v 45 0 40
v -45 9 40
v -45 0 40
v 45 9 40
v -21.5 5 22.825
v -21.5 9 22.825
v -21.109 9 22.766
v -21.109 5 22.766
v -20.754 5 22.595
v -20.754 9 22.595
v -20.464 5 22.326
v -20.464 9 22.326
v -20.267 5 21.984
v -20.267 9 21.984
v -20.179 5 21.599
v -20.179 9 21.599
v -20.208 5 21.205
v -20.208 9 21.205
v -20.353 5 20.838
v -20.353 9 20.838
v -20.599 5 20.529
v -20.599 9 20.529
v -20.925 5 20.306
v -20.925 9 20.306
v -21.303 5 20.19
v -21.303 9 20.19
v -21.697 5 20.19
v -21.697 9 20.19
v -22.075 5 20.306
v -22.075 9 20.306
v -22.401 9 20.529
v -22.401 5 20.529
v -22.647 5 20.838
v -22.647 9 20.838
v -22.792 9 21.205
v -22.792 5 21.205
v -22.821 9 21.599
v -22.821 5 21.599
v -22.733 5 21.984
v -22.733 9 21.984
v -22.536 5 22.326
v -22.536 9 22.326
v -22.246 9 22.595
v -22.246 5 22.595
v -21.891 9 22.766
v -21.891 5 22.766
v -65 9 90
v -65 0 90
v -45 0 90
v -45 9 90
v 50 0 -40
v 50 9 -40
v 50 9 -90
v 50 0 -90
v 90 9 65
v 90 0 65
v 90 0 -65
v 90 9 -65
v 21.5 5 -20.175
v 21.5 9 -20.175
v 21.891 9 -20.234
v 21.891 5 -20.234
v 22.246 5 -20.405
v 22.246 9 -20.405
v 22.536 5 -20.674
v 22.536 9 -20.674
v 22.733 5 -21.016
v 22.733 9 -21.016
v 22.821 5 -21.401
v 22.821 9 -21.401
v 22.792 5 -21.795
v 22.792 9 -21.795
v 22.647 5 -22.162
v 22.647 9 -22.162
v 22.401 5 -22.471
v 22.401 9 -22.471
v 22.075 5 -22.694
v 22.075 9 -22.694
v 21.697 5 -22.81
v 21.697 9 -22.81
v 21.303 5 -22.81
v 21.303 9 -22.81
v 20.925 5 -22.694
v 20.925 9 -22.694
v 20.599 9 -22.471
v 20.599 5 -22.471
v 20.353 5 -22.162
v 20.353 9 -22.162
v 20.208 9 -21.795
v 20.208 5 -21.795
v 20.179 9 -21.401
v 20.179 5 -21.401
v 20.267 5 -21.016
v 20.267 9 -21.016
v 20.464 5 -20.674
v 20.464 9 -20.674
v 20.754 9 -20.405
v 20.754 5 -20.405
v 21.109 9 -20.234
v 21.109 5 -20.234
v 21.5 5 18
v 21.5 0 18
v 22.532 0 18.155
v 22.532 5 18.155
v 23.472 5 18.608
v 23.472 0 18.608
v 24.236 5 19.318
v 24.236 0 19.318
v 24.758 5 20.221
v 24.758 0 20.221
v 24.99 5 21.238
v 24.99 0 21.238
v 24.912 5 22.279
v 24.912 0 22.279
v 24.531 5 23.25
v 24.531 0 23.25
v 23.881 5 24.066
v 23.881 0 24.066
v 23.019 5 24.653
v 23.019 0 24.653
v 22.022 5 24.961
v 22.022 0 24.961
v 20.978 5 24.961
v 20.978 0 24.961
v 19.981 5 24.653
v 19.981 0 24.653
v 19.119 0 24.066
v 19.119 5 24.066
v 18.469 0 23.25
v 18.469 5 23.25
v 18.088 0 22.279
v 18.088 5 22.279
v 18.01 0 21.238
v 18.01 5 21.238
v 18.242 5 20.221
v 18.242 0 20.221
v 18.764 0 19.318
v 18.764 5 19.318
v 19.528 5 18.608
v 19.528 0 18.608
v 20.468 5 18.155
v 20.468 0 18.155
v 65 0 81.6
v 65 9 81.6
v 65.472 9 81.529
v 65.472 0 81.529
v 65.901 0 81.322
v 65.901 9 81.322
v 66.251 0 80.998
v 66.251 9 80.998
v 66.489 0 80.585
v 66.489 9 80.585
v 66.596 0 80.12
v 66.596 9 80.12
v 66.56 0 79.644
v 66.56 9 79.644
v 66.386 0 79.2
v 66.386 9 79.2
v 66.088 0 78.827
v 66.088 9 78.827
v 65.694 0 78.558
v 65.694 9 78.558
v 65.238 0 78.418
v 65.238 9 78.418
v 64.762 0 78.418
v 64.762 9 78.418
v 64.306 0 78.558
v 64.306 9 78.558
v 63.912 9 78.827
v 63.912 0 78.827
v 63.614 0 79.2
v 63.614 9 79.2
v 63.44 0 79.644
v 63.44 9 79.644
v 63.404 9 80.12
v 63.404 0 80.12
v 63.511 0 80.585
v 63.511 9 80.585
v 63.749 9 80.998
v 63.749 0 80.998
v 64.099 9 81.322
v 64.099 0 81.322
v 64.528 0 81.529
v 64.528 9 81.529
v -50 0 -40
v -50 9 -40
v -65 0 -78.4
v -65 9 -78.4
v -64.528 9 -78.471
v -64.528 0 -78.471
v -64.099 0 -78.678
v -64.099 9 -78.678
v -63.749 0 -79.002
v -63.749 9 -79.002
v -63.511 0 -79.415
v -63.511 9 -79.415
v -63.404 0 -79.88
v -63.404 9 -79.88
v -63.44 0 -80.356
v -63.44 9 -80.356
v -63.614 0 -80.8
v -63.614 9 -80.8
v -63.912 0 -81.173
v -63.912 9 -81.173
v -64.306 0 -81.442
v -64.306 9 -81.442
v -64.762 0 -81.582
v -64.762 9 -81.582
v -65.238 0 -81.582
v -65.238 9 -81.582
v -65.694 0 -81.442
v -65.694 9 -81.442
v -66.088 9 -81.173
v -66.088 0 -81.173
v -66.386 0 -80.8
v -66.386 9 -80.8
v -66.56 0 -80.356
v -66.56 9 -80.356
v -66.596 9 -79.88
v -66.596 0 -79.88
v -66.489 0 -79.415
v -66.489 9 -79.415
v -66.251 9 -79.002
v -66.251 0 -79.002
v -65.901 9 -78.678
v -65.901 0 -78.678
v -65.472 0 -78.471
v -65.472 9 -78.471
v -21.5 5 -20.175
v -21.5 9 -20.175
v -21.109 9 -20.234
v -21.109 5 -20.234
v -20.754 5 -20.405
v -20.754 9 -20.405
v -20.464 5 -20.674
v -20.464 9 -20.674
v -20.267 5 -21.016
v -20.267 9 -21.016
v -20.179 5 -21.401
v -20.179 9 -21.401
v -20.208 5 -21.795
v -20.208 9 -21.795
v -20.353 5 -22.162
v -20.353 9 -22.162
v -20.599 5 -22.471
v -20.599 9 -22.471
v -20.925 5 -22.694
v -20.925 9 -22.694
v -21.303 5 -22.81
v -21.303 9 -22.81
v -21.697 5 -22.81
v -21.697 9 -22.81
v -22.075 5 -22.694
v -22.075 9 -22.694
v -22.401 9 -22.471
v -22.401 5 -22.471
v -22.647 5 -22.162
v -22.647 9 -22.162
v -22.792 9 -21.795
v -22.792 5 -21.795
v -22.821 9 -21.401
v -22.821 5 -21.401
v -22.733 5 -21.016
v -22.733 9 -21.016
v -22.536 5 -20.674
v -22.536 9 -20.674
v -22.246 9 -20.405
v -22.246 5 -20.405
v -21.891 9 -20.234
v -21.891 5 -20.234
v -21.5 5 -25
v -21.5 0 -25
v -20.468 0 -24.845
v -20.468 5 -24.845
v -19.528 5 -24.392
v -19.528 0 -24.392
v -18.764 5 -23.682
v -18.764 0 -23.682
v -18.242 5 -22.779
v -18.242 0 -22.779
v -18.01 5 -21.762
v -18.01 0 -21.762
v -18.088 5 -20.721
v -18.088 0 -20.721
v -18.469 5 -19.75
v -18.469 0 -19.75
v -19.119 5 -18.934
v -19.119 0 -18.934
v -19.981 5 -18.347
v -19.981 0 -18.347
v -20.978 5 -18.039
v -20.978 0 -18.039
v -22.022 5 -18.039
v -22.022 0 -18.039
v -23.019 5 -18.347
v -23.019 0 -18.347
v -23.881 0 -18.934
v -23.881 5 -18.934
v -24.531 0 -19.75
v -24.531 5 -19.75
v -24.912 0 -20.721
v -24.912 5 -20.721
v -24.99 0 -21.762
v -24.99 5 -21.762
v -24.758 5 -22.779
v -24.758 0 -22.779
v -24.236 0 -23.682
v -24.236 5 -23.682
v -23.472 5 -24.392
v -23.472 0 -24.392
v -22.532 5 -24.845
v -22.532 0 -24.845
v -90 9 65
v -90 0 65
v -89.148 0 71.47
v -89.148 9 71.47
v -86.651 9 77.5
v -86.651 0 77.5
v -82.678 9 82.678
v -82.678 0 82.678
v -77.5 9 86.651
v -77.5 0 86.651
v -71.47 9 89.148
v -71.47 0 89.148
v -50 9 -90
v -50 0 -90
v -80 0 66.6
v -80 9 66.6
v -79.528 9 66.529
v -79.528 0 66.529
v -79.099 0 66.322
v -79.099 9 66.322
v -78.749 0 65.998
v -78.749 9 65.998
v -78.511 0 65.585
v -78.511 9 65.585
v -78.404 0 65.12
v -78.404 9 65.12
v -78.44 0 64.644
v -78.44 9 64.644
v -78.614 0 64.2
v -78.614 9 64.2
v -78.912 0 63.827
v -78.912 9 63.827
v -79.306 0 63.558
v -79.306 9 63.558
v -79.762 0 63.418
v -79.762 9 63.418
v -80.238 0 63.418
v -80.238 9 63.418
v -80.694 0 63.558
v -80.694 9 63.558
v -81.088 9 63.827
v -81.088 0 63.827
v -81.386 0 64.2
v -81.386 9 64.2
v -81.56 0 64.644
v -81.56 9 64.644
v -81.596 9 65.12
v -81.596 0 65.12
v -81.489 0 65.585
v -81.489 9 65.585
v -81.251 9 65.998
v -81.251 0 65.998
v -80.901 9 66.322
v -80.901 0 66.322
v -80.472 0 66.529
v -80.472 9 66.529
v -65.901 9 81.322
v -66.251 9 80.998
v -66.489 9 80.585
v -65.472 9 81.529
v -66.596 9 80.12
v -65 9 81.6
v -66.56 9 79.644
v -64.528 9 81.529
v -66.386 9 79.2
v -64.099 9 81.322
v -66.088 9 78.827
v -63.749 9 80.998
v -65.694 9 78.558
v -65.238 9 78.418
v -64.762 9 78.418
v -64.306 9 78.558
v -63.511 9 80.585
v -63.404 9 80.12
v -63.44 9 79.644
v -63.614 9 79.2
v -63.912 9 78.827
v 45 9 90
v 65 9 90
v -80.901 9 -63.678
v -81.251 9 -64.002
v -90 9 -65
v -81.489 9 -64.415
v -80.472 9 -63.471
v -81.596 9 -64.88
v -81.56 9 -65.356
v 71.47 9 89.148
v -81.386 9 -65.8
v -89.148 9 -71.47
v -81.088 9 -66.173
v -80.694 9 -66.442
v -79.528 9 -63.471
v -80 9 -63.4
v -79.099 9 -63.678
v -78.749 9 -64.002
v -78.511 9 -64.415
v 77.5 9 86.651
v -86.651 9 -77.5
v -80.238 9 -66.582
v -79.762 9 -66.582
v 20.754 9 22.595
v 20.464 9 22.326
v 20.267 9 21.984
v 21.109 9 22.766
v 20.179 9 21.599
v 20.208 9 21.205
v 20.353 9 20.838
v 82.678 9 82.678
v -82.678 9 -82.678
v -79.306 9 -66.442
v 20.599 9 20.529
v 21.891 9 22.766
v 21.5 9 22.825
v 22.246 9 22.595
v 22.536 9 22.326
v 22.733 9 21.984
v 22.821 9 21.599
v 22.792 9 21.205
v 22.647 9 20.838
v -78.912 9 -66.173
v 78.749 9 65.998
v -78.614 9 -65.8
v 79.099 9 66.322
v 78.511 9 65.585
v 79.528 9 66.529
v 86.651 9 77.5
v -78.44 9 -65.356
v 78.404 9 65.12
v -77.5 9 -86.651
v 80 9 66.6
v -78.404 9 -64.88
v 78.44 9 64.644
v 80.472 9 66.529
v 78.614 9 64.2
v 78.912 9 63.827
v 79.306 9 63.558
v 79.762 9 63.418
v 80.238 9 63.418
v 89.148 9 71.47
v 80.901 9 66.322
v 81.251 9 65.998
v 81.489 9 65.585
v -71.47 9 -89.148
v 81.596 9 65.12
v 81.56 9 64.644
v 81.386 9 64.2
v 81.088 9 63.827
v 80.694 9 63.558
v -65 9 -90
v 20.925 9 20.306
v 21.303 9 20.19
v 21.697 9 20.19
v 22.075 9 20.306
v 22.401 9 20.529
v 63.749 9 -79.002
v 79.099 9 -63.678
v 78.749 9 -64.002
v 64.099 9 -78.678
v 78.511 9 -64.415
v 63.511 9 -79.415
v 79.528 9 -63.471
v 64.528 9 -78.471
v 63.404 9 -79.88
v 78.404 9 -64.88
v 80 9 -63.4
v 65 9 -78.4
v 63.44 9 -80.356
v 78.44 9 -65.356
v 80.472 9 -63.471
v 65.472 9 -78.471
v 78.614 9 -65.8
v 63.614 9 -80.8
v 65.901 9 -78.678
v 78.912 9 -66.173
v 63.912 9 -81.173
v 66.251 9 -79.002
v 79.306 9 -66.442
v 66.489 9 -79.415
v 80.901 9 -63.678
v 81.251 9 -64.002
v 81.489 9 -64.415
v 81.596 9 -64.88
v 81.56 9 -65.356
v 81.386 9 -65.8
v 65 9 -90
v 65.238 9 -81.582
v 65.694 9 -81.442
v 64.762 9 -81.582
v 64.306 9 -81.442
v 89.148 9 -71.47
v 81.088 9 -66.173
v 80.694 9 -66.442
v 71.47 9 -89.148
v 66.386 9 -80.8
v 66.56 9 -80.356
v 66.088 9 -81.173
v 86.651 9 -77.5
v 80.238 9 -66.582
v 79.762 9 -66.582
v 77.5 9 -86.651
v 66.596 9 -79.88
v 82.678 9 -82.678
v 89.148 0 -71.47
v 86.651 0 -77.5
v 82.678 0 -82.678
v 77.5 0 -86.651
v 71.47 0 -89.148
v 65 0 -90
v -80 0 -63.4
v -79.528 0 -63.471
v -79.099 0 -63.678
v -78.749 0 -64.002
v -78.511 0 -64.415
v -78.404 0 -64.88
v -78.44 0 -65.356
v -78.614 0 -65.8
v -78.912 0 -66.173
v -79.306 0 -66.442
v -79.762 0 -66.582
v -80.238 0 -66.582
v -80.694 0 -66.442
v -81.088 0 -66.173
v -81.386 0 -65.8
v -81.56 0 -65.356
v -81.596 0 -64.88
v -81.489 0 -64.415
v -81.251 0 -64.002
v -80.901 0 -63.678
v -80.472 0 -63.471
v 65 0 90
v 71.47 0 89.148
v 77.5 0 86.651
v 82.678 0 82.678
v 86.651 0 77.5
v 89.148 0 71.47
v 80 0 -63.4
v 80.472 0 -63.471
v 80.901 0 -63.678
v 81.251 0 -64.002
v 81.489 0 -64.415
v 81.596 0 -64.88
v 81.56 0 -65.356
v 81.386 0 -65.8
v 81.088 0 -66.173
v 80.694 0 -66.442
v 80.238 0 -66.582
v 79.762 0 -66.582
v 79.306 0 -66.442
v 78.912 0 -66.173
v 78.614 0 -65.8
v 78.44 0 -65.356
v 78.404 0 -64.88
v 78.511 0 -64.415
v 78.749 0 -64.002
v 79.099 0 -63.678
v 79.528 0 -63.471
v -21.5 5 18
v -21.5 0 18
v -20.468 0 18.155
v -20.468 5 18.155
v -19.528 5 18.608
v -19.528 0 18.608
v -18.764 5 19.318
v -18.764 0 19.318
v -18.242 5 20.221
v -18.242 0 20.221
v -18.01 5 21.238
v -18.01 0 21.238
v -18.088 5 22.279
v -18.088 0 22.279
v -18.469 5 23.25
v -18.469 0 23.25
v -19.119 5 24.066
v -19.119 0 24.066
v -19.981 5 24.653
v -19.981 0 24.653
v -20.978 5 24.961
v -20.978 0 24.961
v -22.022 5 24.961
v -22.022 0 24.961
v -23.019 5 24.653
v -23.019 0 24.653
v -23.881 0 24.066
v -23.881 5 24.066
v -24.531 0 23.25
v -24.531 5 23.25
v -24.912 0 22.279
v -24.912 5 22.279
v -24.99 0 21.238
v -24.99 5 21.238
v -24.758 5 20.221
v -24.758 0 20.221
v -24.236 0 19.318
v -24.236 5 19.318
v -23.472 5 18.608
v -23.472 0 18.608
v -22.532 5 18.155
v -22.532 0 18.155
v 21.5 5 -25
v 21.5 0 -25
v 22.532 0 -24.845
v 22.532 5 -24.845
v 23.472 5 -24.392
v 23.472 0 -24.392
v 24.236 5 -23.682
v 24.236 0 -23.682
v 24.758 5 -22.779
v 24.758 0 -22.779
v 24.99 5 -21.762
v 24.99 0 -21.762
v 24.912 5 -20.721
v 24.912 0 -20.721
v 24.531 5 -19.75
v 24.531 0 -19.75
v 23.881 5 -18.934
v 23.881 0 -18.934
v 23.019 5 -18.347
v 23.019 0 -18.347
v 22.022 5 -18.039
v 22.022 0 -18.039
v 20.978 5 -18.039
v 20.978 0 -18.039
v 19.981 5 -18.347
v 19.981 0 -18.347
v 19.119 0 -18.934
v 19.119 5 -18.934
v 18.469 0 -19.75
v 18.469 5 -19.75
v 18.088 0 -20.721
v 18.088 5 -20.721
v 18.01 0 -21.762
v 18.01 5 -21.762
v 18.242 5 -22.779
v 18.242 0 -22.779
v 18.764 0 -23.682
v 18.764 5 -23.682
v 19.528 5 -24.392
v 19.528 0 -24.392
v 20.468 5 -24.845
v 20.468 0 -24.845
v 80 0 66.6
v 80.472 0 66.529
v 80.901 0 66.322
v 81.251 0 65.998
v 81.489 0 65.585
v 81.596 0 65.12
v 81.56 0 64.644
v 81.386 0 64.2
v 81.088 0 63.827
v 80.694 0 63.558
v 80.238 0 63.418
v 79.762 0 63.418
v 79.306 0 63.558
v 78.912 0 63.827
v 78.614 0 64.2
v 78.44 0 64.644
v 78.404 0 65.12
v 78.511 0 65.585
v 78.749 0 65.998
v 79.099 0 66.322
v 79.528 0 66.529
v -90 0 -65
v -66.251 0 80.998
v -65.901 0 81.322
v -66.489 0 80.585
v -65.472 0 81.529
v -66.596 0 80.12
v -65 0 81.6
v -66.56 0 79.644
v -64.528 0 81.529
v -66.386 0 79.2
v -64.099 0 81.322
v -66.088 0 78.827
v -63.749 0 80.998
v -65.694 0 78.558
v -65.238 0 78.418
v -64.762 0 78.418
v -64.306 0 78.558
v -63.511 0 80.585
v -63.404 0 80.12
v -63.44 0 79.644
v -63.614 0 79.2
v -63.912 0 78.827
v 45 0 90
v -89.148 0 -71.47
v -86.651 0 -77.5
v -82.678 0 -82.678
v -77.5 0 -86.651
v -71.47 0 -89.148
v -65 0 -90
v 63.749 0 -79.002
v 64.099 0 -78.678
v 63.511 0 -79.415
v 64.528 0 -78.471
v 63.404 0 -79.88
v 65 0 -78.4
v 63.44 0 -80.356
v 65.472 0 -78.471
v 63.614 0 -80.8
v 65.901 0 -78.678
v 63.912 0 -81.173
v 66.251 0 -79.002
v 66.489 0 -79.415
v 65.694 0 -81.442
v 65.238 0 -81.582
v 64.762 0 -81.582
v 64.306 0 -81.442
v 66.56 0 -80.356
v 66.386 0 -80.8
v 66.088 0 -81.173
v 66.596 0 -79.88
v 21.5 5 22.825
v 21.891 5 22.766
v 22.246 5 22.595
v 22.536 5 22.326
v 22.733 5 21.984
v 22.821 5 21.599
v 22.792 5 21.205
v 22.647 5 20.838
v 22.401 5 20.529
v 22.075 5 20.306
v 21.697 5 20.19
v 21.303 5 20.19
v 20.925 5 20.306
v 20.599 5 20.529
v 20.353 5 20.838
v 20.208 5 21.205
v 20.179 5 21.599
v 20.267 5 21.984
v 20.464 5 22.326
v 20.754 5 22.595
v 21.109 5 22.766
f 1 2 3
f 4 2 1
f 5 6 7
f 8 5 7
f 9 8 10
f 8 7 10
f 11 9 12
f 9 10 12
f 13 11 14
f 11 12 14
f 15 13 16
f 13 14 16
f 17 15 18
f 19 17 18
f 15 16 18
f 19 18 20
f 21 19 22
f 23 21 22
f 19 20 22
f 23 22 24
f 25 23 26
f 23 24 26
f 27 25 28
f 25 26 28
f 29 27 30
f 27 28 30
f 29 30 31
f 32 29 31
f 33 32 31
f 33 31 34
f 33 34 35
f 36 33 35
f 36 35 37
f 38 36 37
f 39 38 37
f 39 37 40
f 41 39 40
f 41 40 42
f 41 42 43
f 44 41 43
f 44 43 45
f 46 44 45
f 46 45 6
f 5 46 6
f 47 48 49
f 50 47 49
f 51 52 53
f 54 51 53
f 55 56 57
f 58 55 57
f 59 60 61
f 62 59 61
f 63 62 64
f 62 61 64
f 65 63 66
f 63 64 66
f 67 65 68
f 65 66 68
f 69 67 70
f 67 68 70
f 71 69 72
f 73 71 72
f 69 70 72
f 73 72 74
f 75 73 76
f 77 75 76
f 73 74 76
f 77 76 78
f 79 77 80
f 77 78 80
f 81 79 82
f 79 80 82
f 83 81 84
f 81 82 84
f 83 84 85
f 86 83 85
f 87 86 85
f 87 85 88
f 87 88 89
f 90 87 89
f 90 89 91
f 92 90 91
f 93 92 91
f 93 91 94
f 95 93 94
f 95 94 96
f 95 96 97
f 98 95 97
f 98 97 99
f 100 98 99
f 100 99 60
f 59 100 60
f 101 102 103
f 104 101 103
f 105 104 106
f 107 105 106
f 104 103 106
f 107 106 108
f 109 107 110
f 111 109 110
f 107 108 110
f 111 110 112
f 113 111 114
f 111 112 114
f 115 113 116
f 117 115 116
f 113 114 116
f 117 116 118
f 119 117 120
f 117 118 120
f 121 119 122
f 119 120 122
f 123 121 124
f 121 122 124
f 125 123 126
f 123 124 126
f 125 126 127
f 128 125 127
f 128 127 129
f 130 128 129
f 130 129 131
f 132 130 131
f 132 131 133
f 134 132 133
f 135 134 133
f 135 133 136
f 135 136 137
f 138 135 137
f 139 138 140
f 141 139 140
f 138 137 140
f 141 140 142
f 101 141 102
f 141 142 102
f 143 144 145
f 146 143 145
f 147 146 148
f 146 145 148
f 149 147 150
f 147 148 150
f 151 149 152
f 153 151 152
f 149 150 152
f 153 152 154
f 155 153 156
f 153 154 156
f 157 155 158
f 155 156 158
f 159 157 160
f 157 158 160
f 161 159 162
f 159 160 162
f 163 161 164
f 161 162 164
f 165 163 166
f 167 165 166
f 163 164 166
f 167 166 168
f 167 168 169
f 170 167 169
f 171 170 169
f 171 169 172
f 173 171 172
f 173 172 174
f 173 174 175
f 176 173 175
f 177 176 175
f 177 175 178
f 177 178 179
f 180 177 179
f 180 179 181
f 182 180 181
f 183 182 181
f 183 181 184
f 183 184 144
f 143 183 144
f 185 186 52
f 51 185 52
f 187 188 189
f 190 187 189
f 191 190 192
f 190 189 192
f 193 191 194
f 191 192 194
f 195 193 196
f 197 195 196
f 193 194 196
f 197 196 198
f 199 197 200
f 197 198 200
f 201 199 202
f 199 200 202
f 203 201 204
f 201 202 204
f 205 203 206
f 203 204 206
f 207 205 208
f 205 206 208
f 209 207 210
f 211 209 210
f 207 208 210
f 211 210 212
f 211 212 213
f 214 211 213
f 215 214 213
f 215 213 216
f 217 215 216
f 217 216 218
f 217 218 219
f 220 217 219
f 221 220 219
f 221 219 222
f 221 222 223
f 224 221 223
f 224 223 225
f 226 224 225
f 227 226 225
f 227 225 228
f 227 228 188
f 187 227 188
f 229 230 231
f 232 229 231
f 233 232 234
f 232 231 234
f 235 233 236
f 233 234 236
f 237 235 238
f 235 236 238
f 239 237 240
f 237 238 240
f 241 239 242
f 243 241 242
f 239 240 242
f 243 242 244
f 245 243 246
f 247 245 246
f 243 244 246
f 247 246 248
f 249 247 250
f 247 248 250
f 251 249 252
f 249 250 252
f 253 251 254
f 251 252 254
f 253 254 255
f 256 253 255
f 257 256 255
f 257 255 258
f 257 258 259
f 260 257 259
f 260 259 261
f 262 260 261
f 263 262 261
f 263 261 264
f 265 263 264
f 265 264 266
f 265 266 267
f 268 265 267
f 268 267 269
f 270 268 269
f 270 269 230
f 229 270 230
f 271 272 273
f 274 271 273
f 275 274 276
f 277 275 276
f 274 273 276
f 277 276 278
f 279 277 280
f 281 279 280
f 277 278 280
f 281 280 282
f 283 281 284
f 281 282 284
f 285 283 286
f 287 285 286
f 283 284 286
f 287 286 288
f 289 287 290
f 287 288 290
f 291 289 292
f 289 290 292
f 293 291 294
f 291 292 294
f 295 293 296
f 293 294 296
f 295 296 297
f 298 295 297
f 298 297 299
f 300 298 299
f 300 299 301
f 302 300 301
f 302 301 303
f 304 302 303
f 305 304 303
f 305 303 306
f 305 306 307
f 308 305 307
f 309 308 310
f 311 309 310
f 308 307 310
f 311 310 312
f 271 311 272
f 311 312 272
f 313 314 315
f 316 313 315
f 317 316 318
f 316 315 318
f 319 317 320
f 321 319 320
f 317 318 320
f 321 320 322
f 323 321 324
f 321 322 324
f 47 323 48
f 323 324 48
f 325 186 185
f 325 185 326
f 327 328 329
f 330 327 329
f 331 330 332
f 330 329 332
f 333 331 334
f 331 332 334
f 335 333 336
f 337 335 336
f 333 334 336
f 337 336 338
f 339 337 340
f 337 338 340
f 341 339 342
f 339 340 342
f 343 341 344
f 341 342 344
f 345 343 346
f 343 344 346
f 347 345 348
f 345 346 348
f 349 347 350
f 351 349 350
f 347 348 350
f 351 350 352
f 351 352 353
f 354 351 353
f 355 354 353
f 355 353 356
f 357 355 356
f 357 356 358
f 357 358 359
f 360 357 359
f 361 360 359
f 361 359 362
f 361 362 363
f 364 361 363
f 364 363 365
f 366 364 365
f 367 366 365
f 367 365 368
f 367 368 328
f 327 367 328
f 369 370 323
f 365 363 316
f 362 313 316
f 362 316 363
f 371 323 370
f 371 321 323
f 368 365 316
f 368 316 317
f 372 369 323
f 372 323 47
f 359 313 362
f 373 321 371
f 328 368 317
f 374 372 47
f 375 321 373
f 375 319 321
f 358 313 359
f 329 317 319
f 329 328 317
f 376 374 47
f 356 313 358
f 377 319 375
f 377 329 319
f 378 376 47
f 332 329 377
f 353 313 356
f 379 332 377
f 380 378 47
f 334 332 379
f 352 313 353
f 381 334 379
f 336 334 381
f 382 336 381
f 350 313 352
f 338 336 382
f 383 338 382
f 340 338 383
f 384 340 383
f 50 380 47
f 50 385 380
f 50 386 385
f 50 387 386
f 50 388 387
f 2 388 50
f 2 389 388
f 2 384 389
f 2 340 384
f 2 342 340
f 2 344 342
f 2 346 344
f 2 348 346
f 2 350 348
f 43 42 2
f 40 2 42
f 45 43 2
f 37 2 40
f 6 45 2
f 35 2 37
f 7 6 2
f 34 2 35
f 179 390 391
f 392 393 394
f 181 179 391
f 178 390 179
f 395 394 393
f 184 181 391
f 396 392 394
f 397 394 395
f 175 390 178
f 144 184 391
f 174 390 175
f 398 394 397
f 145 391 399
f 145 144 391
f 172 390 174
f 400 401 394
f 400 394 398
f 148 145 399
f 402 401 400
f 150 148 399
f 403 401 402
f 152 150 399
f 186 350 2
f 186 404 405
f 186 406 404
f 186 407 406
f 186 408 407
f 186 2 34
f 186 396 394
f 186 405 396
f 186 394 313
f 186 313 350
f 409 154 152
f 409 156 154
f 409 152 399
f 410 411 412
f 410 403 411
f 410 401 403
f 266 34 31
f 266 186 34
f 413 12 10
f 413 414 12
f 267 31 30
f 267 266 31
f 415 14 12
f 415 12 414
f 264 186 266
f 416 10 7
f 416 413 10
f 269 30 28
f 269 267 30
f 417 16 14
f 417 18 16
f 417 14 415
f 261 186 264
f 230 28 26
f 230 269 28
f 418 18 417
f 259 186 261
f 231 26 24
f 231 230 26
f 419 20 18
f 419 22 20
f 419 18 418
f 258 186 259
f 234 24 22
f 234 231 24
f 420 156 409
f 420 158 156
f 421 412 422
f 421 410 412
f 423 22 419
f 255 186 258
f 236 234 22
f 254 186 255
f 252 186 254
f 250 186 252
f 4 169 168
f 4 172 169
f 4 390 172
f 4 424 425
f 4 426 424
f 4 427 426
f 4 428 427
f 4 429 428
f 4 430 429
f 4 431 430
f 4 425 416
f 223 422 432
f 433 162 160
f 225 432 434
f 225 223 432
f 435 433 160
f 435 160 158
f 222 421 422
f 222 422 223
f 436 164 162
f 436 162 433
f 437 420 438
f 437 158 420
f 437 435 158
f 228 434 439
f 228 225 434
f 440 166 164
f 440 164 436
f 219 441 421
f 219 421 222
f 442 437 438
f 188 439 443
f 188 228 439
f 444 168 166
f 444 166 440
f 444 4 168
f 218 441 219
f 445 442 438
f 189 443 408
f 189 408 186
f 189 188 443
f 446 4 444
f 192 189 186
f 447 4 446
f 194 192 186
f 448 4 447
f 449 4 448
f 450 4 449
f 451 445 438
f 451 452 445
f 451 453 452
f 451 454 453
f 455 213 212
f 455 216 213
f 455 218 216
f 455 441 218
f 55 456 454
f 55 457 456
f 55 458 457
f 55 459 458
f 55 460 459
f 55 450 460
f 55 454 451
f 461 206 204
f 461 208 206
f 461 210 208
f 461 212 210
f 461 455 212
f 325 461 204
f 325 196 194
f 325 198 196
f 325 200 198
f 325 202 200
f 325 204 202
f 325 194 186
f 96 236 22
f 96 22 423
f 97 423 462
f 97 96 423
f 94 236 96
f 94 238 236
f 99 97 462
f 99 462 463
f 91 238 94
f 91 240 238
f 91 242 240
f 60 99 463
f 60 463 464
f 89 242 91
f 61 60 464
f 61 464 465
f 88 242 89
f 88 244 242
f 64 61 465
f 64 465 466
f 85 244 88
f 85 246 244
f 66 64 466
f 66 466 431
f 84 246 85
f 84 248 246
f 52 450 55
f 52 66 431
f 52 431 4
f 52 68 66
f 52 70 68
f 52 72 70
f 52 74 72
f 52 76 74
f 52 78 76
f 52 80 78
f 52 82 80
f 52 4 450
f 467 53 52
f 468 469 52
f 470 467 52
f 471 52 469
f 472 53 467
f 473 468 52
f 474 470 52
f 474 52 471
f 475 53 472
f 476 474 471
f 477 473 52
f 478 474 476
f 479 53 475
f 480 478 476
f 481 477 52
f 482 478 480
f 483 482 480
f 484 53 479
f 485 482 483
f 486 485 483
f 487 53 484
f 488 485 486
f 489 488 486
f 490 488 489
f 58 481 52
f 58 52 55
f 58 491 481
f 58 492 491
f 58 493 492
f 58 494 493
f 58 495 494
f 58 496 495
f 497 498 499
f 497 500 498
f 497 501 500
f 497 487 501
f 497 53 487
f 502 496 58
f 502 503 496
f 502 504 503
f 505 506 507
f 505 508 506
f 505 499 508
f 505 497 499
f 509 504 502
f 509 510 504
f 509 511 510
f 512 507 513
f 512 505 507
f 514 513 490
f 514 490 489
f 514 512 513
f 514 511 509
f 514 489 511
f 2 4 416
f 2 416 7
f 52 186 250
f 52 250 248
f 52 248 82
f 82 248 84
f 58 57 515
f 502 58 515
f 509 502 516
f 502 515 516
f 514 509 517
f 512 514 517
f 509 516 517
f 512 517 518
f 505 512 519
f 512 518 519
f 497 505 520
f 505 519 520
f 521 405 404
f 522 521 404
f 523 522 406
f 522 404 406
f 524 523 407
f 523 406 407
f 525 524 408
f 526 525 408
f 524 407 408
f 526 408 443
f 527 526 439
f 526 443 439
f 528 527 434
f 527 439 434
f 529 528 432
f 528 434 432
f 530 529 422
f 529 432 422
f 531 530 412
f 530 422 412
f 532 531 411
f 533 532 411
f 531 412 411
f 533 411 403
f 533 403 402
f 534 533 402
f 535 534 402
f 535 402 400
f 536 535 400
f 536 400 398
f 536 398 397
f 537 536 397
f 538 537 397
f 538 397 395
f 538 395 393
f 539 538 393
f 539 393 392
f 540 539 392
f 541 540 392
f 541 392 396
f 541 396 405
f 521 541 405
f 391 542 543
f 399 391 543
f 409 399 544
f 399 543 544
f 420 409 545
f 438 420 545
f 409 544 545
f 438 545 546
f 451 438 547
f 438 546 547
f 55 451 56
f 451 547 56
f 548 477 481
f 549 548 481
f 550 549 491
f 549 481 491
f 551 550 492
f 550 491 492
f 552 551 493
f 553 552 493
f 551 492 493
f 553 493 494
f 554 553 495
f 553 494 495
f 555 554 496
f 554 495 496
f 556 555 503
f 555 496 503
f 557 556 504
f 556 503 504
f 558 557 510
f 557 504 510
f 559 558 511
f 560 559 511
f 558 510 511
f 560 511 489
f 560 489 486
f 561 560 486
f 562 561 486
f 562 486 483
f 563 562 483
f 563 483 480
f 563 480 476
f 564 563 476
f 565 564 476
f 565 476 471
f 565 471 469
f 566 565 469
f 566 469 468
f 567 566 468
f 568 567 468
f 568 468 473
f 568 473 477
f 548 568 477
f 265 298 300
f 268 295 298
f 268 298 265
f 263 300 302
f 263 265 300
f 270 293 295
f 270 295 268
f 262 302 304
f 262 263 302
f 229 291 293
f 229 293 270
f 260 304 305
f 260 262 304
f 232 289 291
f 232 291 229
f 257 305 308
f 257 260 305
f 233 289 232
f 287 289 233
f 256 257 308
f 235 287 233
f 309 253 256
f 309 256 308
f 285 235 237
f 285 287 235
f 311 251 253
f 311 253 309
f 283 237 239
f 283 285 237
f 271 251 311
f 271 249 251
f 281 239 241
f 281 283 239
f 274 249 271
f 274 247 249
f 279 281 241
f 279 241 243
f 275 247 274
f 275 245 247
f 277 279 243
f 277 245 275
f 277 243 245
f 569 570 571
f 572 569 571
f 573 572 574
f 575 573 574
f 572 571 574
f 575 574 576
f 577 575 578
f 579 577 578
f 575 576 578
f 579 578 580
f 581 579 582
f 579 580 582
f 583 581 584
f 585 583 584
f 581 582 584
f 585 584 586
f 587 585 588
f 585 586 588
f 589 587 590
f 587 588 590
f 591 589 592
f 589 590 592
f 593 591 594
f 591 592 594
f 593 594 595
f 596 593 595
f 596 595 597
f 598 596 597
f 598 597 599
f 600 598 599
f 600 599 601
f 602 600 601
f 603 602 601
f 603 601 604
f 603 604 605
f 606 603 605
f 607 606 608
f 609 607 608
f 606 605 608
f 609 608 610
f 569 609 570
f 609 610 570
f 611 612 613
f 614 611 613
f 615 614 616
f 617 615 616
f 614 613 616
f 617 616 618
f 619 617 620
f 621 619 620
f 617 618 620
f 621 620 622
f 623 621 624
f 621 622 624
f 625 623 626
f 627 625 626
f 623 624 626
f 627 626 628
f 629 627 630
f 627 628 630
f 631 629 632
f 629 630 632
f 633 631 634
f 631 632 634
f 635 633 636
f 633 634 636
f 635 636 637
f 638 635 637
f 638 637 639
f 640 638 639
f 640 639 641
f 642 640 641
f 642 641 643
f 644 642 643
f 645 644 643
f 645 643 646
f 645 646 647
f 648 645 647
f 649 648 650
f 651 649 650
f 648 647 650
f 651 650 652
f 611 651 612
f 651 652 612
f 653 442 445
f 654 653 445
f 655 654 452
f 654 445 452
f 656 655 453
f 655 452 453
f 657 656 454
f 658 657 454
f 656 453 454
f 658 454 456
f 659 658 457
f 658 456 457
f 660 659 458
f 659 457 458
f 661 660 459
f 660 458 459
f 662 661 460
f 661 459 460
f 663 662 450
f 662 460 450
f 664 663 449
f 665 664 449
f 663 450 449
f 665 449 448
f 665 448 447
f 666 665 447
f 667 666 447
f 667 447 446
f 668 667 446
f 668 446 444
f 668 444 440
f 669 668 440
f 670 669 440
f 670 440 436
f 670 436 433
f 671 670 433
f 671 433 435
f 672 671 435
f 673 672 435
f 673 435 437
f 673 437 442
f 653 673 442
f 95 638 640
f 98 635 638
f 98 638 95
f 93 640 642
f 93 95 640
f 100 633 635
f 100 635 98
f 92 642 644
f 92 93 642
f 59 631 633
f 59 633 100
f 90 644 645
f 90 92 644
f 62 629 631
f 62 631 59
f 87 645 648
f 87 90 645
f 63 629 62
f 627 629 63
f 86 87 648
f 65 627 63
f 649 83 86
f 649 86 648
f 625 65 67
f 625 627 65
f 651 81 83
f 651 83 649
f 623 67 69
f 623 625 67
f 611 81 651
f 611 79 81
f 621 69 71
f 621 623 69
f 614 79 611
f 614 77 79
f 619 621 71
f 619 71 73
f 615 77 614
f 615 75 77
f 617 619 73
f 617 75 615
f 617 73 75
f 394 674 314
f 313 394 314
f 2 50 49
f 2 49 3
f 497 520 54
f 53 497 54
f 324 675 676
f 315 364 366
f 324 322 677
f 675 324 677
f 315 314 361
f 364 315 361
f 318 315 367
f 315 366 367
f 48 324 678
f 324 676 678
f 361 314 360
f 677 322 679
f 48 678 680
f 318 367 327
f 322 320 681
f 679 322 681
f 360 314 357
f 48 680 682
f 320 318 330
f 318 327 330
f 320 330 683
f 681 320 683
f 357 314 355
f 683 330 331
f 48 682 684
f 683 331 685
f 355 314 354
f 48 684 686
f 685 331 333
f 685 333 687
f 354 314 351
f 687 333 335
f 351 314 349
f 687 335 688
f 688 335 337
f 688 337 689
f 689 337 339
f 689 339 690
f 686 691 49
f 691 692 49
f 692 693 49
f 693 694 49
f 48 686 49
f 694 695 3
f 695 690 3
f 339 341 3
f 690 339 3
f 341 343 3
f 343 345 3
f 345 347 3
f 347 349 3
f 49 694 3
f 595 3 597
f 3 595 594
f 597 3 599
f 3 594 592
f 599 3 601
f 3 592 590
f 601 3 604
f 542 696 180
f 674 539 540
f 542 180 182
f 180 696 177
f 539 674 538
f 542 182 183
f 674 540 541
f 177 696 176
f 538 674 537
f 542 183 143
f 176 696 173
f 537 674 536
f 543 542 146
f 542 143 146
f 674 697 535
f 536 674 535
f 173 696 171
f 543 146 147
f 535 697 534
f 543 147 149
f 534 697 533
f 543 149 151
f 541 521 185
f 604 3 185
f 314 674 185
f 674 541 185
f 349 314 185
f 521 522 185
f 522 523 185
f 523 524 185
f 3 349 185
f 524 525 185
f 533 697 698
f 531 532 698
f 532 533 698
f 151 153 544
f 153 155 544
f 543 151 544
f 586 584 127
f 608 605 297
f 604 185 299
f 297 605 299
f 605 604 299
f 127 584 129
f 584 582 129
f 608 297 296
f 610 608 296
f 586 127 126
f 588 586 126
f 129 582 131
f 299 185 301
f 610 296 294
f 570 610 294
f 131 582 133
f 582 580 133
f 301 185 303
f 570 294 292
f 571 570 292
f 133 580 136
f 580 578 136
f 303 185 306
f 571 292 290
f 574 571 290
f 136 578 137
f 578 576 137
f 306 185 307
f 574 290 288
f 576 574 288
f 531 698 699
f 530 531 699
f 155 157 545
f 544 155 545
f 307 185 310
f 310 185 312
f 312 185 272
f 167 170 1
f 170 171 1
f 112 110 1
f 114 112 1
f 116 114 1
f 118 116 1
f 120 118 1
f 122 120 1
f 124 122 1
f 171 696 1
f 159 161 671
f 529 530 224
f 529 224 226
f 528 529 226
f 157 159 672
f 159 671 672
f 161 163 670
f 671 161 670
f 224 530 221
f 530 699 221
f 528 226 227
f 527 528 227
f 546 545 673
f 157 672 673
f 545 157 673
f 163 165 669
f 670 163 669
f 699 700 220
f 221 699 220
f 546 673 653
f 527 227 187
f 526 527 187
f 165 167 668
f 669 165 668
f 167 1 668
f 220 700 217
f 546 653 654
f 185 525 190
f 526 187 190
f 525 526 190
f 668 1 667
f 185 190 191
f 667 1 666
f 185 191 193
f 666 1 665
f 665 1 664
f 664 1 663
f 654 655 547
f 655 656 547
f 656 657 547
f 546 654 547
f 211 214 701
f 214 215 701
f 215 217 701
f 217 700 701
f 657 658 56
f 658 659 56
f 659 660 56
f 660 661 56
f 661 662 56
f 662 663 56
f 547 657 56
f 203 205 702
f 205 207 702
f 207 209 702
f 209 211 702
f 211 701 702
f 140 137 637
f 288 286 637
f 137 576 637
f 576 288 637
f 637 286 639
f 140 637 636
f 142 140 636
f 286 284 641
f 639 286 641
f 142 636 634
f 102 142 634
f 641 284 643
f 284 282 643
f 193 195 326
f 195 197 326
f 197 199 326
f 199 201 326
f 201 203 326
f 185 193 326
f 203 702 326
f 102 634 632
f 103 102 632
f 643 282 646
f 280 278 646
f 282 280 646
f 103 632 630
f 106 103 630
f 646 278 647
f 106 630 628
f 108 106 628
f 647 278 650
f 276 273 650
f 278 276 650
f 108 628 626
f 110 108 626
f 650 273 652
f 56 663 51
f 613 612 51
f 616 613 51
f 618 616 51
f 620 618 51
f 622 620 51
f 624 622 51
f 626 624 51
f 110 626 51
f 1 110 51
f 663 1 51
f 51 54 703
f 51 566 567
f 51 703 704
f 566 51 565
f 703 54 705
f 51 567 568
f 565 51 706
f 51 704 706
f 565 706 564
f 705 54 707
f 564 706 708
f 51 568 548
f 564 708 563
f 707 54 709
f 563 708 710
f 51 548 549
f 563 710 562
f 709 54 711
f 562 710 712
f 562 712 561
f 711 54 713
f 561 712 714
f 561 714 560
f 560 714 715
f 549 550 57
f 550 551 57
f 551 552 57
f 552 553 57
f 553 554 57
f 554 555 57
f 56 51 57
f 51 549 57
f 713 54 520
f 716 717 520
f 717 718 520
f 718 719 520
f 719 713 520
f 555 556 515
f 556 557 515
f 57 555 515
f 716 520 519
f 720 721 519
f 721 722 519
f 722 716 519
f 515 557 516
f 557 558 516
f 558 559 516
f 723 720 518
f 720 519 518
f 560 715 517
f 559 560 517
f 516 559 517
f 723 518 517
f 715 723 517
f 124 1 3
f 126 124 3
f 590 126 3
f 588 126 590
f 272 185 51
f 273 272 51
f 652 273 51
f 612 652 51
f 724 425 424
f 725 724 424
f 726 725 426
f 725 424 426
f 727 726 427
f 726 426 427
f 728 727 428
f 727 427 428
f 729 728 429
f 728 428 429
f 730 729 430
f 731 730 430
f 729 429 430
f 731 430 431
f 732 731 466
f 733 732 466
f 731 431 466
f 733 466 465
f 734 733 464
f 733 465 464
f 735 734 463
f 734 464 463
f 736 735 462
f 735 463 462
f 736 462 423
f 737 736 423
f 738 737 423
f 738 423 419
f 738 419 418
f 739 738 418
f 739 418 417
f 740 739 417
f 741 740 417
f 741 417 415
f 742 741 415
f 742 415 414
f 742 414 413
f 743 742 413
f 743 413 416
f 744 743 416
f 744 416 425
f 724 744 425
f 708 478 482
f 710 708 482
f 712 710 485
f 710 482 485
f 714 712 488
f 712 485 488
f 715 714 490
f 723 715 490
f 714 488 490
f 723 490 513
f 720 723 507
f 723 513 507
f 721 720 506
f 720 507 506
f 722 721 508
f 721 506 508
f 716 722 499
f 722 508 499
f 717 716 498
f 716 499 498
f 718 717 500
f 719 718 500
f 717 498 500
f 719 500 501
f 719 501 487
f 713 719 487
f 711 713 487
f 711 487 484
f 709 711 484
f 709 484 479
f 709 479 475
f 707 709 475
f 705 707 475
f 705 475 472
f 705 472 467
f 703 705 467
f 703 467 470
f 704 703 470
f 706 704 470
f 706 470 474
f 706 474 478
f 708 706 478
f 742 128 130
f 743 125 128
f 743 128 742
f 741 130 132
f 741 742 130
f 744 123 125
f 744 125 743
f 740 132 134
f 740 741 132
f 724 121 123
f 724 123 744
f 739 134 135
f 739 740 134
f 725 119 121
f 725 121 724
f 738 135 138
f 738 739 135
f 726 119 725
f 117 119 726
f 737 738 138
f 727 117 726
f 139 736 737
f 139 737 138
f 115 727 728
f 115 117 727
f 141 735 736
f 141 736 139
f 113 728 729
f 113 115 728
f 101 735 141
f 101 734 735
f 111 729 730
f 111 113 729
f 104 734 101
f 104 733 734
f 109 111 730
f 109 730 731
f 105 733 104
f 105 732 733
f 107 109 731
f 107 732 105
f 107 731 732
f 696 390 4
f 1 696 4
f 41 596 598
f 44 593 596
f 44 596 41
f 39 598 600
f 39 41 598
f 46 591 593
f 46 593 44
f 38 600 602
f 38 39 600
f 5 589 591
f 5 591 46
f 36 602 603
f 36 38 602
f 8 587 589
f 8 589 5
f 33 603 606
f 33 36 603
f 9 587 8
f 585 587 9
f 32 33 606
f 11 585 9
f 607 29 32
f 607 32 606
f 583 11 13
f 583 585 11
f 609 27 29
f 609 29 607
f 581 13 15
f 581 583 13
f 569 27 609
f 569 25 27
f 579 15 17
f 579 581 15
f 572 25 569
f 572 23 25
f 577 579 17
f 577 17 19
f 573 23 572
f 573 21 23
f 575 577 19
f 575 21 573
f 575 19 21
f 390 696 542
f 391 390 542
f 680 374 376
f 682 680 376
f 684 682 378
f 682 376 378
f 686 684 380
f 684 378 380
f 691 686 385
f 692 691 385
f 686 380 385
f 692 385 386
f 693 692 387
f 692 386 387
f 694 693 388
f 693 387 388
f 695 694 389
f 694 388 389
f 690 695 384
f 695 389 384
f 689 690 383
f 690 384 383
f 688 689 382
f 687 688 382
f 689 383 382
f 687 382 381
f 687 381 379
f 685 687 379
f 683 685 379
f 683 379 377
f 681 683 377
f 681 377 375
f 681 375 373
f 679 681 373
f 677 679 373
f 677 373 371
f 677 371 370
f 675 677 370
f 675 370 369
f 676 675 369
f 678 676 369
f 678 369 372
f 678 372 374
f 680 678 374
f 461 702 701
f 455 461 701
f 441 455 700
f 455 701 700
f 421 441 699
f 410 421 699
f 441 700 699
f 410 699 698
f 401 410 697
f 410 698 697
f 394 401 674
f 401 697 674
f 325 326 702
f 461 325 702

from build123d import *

# Parameters (mm, degrees)
PLATE_DEPTH        = 9
SKETCH3_R          = 1.6
HEX_HOLES_DEPTH    = 128.597021909
SKETCH4_R          = 1.325
LIDAR_HOLES_DEPTH  = 128.597021909
SKETCH5_W          = 100
SKETCH5_H          = 50
SKETCH5_W_2        = 90
CUT_EXTRUDE1_DEPTH = 128.597021909
SKETCH6_R          = 3.5
CUT_EXTRUDE2_DEPTH = 5


with BuildPart() as part:
    # Sketch1 → Plate (new body)
    with BuildSketch(Plane(origin=(0, 0, 0), x_dir=(1, 0, 0), z_dir=(0, 1, 0))):
        with BuildLine():
            Line((-65, -90), (65, -90))
            ThreePointArc((65, -90), (82.67766953, -82.67766953), (90, -65))
            Line((90, -65), (90, 65))
            ThreePointArc((90, 65), (82.67766953, 82.67766953), (65, 90))
            Line((65, 90), (-65, 90))
            ThreePointArc((-65, 90), (-82.67766953, 82.67766953), (-90, 65))
            Line((-90, 65), (-90, -65))
            ThreePointArc((-90, -65), (-82.67766953, -82.67766953), (-65, -90))
        make_face()
    extrude(amount=PLATE_DEPTH)

    # Sketch3 → Hex Holes (cut, through all)
    with BuildSketch(Plane(origin=(0, 9, 0), x_dir=(1, 0, 0), z_dir=(0, 1, 0))):
        with Locations(Location((-65, 80, 0), (0, 0, 270))):
            Circle(SKETCH3_R)
        with Locations(Location((-80, 65, 0), (0, 0, 270))):
            Circle(SKETCH3_R)
        with Locations(Location((80, 65, 0), (0, 0, 270))):
            Circle(SKETCH3_R)
        with Locations(Location((80, -65, 0), (0, 0, 270))):
            Circle(SKETCH3_R)
        with Locations(Location((65, 80, 0), (0, 0, 270))):
            Circle(SKETCH3_R)
        with Locations(Location((65, -80, 0), (0, 0, 270))):
            Circle(SKETCH3_R)
        with Locations(Location((-65, -80, 0), (0, 0, 270))):
            Circle(SKETCH3_R)
        with Locations(Location((-80, -65, 0), (0, 0, 270))):
            Circle(SKETCH3_R)
    extrude(amount=-HEX_HOLES_DEPTH, mode=Mode.SUBTRACT)

    # Sketch4 → LiDAR Holes (cut, through all)
    with BuildSketch(Plane(origin=(0, 9, 0), x_dir=(1, 0, 0), z_dir=(0, 1, 0))):
        with Locations(Location((-21.5, 21.5, 0), (0, 0, 270))):
            Circle(SKETCH4_R)
        with Locations(Location((21.5, 21.5, 0), (0, 0, 270))):
            Circle(SKETCH4_R)
        with Locations(Location((21.5, -21.5, 0), (0, 0, 270))):
            Circle(SKETCH4_R)
        with Locations(Location((-21.5, -21.5, 0), (0, 0, 270))):
            Circle(SKETCH4_R)
    extrude(amount=-LIDAR_HOLES_DEPTH, mode=Mode.SUBTRACT)

    # Sketch5 → Cut-Extrude1 (cut, through all)
    with BuildSketch(Plane(origin=(0, 9, 0), x_dir=(1, 0, 0), z_dir=(0, 1, 0))):
        with Locations((0, 65)):
            Rectangle(SKETCH5_W, SKETCH5_H)
        with Locations((0, -65)):
            Rectangle(SKETCH5_W_2, SKETCH5_H)
    extrude(amount=-CUT_EXTRUDE1_DEPTH, mode=Mode.SUBTRACT)

    # Sketch6 → Cut-Extrude2 (cut)
    with BuildSketch(Plane.XZ):
        with Locations(Location((-21.5, 21.5, 0), (0, 0, 270))):
            Circle(SKETCH6_R)
        with Locations(Location((21.5, 21.5, 0), (0, 0, 270))):
            Circle(SKETCH6_R)
        with Locations(Location((-21.5, -21.5, 0), (0, 0, 270))):
            Circle(SKETCH6_R)
        with Locations(Location((21.5, -21.5, 0), (0, 0, 270))):
            Circle(SKETCH6_R)
    extrude(amount=-CUT_EXTRUDE2_DEPTH, mode=Mode.SUBTRACT)


solid = part.part
